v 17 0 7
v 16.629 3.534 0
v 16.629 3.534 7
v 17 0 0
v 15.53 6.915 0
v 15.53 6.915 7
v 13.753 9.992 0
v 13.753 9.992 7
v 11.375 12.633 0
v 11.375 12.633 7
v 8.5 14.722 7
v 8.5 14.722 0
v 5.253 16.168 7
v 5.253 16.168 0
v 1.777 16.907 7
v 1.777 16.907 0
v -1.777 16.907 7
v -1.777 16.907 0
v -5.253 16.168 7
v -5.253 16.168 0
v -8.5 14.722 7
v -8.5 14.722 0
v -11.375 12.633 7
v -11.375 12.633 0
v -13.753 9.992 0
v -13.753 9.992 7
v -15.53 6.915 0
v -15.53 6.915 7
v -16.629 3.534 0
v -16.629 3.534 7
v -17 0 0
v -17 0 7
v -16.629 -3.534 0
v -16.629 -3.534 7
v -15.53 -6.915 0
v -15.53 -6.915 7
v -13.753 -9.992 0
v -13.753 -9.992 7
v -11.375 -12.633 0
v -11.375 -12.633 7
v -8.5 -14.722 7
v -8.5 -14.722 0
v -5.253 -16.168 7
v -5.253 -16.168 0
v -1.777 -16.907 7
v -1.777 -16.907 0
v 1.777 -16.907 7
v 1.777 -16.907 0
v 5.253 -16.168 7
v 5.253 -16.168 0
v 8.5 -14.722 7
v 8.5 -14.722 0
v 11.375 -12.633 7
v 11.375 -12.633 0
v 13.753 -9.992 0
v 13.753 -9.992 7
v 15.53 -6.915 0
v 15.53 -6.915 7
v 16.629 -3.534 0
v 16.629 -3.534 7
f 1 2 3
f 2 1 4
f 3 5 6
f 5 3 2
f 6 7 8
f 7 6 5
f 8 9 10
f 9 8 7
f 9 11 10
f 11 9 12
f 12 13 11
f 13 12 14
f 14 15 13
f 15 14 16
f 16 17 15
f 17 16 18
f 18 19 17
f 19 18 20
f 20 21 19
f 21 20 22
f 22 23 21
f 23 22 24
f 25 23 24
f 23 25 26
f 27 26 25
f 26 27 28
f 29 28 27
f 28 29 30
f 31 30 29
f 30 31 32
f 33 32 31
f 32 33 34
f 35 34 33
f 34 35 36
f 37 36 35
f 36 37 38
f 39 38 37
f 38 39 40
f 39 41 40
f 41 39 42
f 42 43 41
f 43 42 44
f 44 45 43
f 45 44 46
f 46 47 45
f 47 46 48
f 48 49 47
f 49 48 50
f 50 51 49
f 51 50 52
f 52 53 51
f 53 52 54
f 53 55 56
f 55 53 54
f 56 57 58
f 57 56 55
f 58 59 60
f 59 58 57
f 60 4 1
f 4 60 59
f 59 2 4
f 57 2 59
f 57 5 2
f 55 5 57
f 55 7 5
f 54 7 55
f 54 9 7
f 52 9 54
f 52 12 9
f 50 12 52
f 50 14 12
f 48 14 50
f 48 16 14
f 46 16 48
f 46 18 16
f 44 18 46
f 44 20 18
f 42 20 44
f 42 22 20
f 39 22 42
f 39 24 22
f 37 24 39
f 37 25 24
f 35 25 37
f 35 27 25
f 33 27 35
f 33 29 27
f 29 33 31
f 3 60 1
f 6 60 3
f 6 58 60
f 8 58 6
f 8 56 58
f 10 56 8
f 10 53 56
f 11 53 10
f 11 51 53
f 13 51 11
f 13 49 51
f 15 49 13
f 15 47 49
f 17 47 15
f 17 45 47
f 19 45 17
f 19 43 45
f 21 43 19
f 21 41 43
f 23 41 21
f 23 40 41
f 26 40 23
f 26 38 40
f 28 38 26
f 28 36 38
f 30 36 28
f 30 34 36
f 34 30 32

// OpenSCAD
// Generated by SolidPython 1.0.1 on 2020-07-29 00:39:25


cylinder(h = 7, r1 = 17, r2 = 17);
/***********************************************
*********      SolidPython code:      **********
************************************************
 
# import packages: SolidPython
from solid import *
from solid.utils import *
from itertools import chain, combinations


class Resize:

    def __init__(self, scad_file):
        self.scad_file = scad_file
        #self.scad_file = import_scad(scad_file)
        # cone/cylinder param:
        self.r1 = 0
        self.r2 = 0
        self.h = 0
        # rectangular prism param:
        self.w = 0
        self.l = 0
        # ellipse param:
        self.r = 0

    # import OpenScad code (file name corresponds to shape)


    # classify shape + parameters
    def assign(self, param1, param2, param3):
        if self.scad_file == 'cone.scad':
            self.r1 = param1
            self.r2 = param2
            self.h = param3
        elif self.scad_file == 'cylinder.scad':
            self.r1 = param1
            self.r2 = param2
            self.h = param3
        elif self.scad_file == 'rectangularPrism.scad':
            self.h = param1
            self.l = param2
            self.w = param3
        else:
            self.r = param1
            self.h = param2

    # resize parameters
    def iterate(self):
        x = range(3, 20, 2)
        i = 1
        if self.scad_file == 'cone.scad':
            tempList = list(combinations(x, 2))
            for temp in tempList:
                param1 = temp[0]
                param2 = temp[1]
                filepath = 'produced_scad_files/' + 'cone' + str(param1) + '_' + str(param2) + '_' + '.scad'
                scad_render_to_file(cylinder(h=param1, r1=param2, r2=0), filepath)

        elif self.scad_file == 'cylinder.scad':
            tempList = list(combinations(x, 3))
            for temp in tempList:
                param1 = temp[0]
                param2 = temp[1]
                filepath = 'produced_scad_files/' + 'cylinder' + str(param1) + '_' + str(param2) + '_' + '.scad'
                scad_render_to_file(cylinder(h=param1, r1=param2, r2=param2), filepath)

        elif self.scad_file == 'rectangularPrism.scad':
            tempList = list(combinations(x, 3))
            for temp in tempList:
                param1 = temp[0]
                param2 = temp[1]
                param3 = temp[2]
                filepath = 'produced_scad_files/' + 'rectangularPrism' + str(param1) + '_' + str(param2) + '_' + str(
                    param3) + '.scad'
                scad_render_to_file(cube(size=(param1, param2, param3)), filepath)

        elif self.scad_file == 'ellipse.scad':
            tempList = list(combinations(x, 4))
            for temp in tempList:
                param1 = temp[0]
                param2 = temp[1]
                param3 = temp[2]
                param4 = temp[3]
                filepath = 'produced_scad_files/' + 'ellipse' + str(param1) + '_' + str(param2) + '_' + str(param3) + '_' + str(param4) + '.scad'
                scad_render_to_file(scale([param1, param2, param3])(sphere(r=param4)), filepath)

    def render_to_scadfile(self):
        scad_render_to_file(scad, 'example.scad') 
 
************************************************/
